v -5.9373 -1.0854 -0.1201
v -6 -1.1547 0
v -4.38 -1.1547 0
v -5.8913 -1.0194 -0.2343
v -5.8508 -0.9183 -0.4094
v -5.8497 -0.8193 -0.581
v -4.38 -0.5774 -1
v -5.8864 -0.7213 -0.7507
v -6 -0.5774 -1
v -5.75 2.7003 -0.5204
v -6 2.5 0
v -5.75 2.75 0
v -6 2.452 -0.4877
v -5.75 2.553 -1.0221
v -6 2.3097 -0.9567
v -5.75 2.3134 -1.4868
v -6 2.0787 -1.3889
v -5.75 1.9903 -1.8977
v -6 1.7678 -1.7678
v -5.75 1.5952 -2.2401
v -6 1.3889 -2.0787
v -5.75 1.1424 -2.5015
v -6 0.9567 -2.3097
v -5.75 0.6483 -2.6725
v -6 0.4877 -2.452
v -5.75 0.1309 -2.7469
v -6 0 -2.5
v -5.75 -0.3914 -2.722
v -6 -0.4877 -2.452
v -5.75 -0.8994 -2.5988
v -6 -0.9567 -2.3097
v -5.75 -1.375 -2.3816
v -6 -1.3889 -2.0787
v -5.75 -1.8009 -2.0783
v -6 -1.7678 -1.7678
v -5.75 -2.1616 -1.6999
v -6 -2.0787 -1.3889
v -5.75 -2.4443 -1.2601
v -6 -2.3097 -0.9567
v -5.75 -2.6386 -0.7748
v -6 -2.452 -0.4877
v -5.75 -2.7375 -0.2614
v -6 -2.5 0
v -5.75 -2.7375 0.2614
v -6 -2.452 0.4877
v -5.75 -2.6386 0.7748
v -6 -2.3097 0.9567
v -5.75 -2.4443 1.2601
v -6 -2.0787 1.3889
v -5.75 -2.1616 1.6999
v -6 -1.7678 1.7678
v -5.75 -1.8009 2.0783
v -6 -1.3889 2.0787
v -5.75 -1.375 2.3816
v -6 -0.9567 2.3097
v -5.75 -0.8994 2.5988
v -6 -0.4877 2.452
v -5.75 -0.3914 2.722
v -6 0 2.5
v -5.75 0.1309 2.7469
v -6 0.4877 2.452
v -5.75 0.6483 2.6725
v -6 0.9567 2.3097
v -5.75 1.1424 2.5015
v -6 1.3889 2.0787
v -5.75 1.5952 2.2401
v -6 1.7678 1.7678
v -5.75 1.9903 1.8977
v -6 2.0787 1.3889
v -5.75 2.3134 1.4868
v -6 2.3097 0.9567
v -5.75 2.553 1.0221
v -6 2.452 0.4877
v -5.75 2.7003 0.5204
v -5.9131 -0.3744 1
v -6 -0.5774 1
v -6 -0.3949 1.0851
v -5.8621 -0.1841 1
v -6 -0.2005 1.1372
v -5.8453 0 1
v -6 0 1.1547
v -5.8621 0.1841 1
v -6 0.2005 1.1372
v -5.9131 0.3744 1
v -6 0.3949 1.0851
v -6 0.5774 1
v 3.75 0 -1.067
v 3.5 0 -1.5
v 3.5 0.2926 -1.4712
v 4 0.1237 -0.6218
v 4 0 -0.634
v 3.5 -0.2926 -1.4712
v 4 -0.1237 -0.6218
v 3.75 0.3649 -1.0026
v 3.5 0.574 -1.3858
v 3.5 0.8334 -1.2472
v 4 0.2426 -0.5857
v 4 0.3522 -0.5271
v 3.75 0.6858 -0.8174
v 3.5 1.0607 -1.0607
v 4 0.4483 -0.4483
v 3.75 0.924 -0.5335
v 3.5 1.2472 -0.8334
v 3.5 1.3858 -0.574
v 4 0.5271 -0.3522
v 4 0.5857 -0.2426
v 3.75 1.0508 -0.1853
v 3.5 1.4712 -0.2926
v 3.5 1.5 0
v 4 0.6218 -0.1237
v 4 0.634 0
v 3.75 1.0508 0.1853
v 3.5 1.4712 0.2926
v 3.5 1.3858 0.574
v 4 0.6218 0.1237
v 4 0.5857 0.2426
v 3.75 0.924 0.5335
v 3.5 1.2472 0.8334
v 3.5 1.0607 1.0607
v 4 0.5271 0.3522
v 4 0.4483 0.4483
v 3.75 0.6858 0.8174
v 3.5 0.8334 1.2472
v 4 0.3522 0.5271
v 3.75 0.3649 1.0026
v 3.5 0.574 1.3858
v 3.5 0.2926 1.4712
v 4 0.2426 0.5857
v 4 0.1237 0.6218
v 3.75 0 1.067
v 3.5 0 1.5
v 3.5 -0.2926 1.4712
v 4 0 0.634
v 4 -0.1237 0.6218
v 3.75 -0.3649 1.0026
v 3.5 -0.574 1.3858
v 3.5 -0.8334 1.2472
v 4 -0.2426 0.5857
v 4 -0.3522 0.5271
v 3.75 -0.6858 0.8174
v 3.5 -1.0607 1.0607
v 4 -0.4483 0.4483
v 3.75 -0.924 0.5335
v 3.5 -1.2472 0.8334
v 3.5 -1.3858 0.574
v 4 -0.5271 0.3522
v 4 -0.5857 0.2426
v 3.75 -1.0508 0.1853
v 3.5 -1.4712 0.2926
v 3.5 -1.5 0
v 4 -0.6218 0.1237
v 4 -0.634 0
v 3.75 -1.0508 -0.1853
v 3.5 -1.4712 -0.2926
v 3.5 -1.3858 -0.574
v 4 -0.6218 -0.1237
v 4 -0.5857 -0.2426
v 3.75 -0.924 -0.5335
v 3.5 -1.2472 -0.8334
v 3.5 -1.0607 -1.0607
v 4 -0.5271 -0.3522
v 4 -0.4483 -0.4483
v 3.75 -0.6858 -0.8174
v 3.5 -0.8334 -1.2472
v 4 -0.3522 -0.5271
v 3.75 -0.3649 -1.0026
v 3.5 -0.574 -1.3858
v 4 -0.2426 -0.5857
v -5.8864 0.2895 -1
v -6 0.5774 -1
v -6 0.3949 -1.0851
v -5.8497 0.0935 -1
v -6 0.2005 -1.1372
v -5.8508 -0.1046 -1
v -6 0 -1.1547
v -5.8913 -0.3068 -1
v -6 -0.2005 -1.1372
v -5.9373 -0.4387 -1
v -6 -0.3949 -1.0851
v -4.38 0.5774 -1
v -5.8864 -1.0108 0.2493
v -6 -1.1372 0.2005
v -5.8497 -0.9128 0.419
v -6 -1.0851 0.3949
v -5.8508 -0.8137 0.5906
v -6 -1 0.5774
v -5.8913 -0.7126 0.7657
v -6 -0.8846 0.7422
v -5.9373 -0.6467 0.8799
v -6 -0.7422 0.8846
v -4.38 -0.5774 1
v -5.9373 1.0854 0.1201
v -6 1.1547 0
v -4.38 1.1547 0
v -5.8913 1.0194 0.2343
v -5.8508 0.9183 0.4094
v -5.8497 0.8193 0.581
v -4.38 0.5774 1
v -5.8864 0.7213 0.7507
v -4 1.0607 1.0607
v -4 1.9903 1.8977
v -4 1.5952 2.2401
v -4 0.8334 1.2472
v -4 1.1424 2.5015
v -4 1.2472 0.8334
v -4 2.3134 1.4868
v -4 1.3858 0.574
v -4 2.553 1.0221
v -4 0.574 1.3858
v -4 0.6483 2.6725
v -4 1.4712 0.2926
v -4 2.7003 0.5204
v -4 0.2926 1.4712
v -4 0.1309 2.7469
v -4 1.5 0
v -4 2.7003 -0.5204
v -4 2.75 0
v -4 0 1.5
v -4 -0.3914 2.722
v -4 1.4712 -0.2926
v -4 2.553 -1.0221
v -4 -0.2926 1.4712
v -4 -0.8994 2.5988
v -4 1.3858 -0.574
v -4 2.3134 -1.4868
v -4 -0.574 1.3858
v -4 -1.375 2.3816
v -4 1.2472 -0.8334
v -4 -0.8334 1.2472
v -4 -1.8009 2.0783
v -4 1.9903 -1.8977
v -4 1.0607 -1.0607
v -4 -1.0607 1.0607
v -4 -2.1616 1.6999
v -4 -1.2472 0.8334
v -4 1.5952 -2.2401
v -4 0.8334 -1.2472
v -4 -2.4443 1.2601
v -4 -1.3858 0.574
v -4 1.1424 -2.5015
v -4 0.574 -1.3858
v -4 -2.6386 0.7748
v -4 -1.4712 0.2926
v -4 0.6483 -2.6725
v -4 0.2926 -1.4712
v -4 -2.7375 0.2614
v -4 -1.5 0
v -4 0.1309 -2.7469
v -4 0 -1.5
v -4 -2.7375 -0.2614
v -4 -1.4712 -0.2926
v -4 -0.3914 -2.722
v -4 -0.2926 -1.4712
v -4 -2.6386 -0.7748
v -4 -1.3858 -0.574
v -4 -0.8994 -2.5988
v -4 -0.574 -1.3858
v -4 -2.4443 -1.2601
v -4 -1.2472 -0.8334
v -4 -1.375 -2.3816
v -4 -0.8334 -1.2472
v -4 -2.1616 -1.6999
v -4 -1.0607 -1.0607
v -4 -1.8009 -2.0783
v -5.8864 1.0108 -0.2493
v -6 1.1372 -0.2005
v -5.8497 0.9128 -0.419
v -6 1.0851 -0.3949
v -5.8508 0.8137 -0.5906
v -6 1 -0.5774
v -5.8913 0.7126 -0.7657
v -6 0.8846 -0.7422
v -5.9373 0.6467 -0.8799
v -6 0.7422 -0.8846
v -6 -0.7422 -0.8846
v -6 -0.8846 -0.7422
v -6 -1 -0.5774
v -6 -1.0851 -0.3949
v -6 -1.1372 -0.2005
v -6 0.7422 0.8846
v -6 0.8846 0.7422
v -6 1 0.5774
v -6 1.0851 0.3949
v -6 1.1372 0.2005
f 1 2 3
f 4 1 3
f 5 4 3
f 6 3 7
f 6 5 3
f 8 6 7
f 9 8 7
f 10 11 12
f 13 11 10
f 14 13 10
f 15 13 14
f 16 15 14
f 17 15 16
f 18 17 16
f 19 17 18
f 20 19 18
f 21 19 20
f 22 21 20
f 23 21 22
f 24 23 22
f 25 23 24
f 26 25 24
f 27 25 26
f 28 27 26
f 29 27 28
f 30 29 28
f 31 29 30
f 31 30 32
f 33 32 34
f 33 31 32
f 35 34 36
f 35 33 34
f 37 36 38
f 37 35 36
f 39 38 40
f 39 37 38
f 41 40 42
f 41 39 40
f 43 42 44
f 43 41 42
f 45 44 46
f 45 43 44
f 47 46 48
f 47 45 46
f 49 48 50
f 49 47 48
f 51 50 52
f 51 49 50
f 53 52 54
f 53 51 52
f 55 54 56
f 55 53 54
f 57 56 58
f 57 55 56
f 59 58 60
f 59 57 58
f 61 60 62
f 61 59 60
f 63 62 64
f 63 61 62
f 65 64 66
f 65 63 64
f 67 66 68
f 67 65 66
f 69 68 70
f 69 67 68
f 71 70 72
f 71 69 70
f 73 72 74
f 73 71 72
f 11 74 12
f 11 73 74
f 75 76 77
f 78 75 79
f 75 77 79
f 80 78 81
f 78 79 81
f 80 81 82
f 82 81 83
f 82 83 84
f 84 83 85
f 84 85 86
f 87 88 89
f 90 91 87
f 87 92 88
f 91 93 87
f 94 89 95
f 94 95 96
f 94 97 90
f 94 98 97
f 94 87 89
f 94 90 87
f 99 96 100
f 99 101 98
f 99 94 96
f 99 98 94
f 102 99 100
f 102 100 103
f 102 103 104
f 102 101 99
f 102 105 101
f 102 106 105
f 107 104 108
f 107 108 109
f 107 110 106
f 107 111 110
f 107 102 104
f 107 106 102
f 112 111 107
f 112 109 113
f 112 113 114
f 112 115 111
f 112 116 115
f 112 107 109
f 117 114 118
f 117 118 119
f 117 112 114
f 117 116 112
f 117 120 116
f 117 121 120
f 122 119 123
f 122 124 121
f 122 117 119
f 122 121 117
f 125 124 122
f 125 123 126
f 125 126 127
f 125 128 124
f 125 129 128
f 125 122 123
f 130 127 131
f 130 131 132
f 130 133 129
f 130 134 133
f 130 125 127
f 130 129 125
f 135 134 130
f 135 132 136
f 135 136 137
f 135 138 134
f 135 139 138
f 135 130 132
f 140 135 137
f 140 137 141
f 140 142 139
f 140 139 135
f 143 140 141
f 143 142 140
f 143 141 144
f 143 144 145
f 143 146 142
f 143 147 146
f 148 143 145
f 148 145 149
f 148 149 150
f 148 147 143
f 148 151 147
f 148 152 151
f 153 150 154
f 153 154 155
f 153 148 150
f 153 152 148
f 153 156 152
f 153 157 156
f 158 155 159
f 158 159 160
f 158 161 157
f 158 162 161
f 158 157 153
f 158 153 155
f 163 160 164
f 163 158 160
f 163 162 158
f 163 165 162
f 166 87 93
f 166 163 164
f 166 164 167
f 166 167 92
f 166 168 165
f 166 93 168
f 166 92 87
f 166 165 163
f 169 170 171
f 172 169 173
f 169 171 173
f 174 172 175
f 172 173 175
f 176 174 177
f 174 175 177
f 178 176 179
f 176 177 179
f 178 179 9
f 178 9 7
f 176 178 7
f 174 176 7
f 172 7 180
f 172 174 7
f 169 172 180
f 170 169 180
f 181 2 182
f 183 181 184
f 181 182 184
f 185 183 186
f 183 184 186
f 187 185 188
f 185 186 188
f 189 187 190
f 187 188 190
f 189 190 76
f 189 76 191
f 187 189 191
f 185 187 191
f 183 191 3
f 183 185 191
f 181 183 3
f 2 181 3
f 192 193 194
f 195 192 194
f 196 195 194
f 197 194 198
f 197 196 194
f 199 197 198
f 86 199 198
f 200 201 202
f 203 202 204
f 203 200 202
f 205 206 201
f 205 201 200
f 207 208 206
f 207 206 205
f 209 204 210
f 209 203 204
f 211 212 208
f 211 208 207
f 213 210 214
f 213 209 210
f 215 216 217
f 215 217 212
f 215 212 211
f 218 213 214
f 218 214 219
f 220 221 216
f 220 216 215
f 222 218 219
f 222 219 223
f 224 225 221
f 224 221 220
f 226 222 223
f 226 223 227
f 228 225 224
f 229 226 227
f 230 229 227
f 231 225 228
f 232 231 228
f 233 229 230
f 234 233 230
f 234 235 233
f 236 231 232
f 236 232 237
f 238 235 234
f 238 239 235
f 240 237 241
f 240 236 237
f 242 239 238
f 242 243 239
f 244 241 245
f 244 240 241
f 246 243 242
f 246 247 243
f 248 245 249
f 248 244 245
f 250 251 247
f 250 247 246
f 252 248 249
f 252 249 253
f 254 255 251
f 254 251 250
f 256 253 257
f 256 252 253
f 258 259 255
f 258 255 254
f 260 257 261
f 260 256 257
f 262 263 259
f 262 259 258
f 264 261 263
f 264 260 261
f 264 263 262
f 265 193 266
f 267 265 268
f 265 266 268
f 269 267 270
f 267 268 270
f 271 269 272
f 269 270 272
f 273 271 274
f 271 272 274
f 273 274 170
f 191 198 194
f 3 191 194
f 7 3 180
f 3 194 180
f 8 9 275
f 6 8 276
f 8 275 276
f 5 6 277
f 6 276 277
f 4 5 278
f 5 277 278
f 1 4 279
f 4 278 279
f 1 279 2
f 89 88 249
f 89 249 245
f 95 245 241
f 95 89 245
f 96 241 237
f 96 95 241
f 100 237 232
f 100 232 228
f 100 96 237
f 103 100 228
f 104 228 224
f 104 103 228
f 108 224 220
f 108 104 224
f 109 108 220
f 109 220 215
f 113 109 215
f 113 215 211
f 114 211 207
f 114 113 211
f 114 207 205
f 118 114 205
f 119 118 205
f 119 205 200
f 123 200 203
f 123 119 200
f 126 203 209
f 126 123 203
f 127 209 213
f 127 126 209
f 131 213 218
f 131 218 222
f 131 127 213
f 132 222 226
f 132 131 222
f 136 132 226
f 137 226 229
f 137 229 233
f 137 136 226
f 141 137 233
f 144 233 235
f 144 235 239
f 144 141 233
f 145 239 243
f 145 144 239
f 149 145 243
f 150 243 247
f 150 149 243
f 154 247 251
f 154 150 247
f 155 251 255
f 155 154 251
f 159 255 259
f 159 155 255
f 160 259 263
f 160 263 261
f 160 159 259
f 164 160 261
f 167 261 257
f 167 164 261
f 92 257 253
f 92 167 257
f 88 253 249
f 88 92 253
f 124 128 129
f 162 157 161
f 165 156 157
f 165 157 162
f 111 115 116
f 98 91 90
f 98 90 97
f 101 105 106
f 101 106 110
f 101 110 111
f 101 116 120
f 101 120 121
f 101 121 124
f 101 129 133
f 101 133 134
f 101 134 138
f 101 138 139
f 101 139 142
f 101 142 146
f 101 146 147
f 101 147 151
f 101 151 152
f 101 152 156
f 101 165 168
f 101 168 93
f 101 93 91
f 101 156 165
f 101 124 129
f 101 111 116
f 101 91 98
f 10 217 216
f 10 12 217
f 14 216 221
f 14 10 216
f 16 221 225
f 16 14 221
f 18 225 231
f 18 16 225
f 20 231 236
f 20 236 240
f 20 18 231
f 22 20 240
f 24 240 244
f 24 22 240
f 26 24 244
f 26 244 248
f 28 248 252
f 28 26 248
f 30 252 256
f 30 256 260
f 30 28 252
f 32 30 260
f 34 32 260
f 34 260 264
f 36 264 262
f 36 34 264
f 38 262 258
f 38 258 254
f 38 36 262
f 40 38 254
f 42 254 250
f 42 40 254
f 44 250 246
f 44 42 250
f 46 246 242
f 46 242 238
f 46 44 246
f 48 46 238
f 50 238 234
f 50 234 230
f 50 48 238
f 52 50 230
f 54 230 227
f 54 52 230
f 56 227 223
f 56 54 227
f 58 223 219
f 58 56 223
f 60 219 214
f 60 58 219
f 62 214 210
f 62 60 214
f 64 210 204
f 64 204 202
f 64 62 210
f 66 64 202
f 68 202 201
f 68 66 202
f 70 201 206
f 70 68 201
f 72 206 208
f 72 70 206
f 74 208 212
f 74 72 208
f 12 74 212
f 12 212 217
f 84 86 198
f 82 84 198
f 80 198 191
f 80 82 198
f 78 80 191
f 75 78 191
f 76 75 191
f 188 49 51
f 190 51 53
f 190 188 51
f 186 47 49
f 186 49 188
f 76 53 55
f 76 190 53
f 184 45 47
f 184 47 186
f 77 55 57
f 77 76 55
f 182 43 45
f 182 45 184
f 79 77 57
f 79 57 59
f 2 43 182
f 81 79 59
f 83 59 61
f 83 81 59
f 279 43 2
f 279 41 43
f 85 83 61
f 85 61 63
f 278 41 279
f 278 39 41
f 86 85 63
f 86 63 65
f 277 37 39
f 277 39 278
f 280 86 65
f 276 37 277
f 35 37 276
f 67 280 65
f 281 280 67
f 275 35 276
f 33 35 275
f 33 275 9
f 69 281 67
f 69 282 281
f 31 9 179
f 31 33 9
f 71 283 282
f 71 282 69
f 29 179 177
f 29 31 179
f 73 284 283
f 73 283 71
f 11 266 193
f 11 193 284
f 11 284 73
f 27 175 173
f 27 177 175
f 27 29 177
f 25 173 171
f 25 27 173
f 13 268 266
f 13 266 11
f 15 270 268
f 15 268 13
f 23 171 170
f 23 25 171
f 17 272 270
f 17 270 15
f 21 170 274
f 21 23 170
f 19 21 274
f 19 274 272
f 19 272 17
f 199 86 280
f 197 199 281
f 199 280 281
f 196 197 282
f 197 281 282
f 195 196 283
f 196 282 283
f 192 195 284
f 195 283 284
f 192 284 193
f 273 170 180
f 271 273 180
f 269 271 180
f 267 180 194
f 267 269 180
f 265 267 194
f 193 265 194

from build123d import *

# Parameters (mm, degrees)
SKETCH2_R              = 1.5
BOSS_EXTRUDE1_DEPTH    = 8
CHAMFER1_SIZE          = 0.375
CUT_SWEEP1_PITCH       = 0.5
CUT_SWEEP1_HEIGHT      = 8.5
CUT_SWEEP1_RADIUS      = 1.5
CUT_SWEEP1_START_ANGLE = -90
CUT_EXTRUDE1_DEPTH     = 1.62
SKETCH8_R              = 1.154700538
CUT_EXTRUDE2_DEPTH     = 11.0000001
CUT_EXTRUDE2_DRAFT     = -45
SKETCH9_R              = 1.5
BOSS_EXTRUDE2_DEPTH    = 8.38
CHAMFER2_SIZE          = 0.5
CHAMFER2_SIZE2         = 0.866025404


with BuildPart() as part:
    # Sketch2 → Boss-Extrude1 (new body)
    with BuildSketch(Plane(origin=(4, 0, 0), x_dir=(0, 0, -1), z_dir=(1, 0, 0))):
        Circle(SKETCH2_R)
    extrude(amount=-BOSS_EXTRUDE1_DEPTH)

    # Chamfer1
    chamfer1_edges = [part.edges().sort_by_distance(p)[0] for p in [
        (4, 0, 1.5),
    ]]
    chamfer(chamfer1_edges, length=CHAMFER1_SIZE)

    # Cut-Sweep1: sweep along a helix
    with BuildLine() as cut_sweep1_path:
        add(Helix(CUT_SWEEP1_PITCH, CUT_SWEEP1_HEIGHT, CUT_SWEEP1_RADIUS, center=(4, 0, 0), direction=(-1, 0, 0), mode=Mode.PRIVATE).rotate(Axis((4, 0, 0), (-1, 0, 0)), CUT_SWEEP1_START_ANGLE))
    # Sketch5 → Cut-Sweep1 (sweep, cut)
    with BuildSketch(Plane.XY):
        Polygon((3.78125, 1.5), (4.21875, 1.5), (4.03125, 1.175240474), (3.96875, 1.175240474), align=None)
    sweep(path=cut_sweep1_path.line, is_frenet=True, mode=Mode.SUBTRACT)

    # Sketch6 → Revolve1 (revolve)
    with BuildSketch(Plane.XY):
        Polygon((-5.75, 2.75), (-6, 2.5), (-6, 0), (-4, 0), (-4, 2.75), align=None)
    revolve(axis=Axis((-4, 0, 0), (-1, 0, 0)))

    # Sketch4 → Cut-Extrude1 (cut)
    with BuildSketch(Plane(origin=(-6, 0, 0), x_dir=(0, 0, -1), z_dir=(1, 0, 0))):
        Polygon((0, 1.154700538), (-1, 0.577350269), (-1, -0.577350269), (0, -1.154700538), (1, -0.577350269), (1, 0.577350269), align=None)
    extrude(amount=CUT_EXTRUDE1_DEPTH, mode=Mode.SUBTRACT)


with BuildPart() as cut_extrude2_tool:
    # Sketch8 → Cut-Extrude2 (with draft: the straight prism first)
    with BuildSketch(Plane.ZY.offset(6)):
        Circle(SKETCH8_R)
    extrude(amount=-CUT_EXTRUDE2_DEPTH)
    # Cut-Extrude2: the draft: its side faces are tilted about the plane it starts from
    cut_extrude2_sides = [cut_extrude2_tool.faces().sort_by_distance(p)[0] for p in [
        (-0.49999995, 0, -1.154700538),
    ]]
    draft(cut_extrude2_sides, Plane.ZY.offset(6), CUT_EXTRUDE2_DRAFT)


with BuildPart() as part_1:
    add(part.part)

    # Cut-Extrude2: cut by cut_extrude2_tool
    add(cut_extrude2_tool.part, mode=Mode.SUBTRACT)

    # Sketch9 → Boss-Extrude2 (add)
    with BuildSketch(Plane(origin=(4, 0, 0), x_dir=(0, 0, -1), z_dir=(1, 0, 0))):
        Circle(SKETCH9_R)
    extrude(amount=-BOSS_EXTRUDE2_DEPTH)

    # Chamfer2
    chamfer2_edges = [part_1.edges().sort_by_distance(p)[0] for p in [
        (4, 0, 1.5),
    ]]
    chamfer2_side = [part_1.faces().sort_by_distance(p)[0] for p in [
        (0, 0, 1.5),
    ]]
    chamfer(chamfer2_edges, length=CHAMFER2_SIZE, length2=CHAMFER2_SIZE2, reference=chamfer2_side[0])


solid = part_1.part
